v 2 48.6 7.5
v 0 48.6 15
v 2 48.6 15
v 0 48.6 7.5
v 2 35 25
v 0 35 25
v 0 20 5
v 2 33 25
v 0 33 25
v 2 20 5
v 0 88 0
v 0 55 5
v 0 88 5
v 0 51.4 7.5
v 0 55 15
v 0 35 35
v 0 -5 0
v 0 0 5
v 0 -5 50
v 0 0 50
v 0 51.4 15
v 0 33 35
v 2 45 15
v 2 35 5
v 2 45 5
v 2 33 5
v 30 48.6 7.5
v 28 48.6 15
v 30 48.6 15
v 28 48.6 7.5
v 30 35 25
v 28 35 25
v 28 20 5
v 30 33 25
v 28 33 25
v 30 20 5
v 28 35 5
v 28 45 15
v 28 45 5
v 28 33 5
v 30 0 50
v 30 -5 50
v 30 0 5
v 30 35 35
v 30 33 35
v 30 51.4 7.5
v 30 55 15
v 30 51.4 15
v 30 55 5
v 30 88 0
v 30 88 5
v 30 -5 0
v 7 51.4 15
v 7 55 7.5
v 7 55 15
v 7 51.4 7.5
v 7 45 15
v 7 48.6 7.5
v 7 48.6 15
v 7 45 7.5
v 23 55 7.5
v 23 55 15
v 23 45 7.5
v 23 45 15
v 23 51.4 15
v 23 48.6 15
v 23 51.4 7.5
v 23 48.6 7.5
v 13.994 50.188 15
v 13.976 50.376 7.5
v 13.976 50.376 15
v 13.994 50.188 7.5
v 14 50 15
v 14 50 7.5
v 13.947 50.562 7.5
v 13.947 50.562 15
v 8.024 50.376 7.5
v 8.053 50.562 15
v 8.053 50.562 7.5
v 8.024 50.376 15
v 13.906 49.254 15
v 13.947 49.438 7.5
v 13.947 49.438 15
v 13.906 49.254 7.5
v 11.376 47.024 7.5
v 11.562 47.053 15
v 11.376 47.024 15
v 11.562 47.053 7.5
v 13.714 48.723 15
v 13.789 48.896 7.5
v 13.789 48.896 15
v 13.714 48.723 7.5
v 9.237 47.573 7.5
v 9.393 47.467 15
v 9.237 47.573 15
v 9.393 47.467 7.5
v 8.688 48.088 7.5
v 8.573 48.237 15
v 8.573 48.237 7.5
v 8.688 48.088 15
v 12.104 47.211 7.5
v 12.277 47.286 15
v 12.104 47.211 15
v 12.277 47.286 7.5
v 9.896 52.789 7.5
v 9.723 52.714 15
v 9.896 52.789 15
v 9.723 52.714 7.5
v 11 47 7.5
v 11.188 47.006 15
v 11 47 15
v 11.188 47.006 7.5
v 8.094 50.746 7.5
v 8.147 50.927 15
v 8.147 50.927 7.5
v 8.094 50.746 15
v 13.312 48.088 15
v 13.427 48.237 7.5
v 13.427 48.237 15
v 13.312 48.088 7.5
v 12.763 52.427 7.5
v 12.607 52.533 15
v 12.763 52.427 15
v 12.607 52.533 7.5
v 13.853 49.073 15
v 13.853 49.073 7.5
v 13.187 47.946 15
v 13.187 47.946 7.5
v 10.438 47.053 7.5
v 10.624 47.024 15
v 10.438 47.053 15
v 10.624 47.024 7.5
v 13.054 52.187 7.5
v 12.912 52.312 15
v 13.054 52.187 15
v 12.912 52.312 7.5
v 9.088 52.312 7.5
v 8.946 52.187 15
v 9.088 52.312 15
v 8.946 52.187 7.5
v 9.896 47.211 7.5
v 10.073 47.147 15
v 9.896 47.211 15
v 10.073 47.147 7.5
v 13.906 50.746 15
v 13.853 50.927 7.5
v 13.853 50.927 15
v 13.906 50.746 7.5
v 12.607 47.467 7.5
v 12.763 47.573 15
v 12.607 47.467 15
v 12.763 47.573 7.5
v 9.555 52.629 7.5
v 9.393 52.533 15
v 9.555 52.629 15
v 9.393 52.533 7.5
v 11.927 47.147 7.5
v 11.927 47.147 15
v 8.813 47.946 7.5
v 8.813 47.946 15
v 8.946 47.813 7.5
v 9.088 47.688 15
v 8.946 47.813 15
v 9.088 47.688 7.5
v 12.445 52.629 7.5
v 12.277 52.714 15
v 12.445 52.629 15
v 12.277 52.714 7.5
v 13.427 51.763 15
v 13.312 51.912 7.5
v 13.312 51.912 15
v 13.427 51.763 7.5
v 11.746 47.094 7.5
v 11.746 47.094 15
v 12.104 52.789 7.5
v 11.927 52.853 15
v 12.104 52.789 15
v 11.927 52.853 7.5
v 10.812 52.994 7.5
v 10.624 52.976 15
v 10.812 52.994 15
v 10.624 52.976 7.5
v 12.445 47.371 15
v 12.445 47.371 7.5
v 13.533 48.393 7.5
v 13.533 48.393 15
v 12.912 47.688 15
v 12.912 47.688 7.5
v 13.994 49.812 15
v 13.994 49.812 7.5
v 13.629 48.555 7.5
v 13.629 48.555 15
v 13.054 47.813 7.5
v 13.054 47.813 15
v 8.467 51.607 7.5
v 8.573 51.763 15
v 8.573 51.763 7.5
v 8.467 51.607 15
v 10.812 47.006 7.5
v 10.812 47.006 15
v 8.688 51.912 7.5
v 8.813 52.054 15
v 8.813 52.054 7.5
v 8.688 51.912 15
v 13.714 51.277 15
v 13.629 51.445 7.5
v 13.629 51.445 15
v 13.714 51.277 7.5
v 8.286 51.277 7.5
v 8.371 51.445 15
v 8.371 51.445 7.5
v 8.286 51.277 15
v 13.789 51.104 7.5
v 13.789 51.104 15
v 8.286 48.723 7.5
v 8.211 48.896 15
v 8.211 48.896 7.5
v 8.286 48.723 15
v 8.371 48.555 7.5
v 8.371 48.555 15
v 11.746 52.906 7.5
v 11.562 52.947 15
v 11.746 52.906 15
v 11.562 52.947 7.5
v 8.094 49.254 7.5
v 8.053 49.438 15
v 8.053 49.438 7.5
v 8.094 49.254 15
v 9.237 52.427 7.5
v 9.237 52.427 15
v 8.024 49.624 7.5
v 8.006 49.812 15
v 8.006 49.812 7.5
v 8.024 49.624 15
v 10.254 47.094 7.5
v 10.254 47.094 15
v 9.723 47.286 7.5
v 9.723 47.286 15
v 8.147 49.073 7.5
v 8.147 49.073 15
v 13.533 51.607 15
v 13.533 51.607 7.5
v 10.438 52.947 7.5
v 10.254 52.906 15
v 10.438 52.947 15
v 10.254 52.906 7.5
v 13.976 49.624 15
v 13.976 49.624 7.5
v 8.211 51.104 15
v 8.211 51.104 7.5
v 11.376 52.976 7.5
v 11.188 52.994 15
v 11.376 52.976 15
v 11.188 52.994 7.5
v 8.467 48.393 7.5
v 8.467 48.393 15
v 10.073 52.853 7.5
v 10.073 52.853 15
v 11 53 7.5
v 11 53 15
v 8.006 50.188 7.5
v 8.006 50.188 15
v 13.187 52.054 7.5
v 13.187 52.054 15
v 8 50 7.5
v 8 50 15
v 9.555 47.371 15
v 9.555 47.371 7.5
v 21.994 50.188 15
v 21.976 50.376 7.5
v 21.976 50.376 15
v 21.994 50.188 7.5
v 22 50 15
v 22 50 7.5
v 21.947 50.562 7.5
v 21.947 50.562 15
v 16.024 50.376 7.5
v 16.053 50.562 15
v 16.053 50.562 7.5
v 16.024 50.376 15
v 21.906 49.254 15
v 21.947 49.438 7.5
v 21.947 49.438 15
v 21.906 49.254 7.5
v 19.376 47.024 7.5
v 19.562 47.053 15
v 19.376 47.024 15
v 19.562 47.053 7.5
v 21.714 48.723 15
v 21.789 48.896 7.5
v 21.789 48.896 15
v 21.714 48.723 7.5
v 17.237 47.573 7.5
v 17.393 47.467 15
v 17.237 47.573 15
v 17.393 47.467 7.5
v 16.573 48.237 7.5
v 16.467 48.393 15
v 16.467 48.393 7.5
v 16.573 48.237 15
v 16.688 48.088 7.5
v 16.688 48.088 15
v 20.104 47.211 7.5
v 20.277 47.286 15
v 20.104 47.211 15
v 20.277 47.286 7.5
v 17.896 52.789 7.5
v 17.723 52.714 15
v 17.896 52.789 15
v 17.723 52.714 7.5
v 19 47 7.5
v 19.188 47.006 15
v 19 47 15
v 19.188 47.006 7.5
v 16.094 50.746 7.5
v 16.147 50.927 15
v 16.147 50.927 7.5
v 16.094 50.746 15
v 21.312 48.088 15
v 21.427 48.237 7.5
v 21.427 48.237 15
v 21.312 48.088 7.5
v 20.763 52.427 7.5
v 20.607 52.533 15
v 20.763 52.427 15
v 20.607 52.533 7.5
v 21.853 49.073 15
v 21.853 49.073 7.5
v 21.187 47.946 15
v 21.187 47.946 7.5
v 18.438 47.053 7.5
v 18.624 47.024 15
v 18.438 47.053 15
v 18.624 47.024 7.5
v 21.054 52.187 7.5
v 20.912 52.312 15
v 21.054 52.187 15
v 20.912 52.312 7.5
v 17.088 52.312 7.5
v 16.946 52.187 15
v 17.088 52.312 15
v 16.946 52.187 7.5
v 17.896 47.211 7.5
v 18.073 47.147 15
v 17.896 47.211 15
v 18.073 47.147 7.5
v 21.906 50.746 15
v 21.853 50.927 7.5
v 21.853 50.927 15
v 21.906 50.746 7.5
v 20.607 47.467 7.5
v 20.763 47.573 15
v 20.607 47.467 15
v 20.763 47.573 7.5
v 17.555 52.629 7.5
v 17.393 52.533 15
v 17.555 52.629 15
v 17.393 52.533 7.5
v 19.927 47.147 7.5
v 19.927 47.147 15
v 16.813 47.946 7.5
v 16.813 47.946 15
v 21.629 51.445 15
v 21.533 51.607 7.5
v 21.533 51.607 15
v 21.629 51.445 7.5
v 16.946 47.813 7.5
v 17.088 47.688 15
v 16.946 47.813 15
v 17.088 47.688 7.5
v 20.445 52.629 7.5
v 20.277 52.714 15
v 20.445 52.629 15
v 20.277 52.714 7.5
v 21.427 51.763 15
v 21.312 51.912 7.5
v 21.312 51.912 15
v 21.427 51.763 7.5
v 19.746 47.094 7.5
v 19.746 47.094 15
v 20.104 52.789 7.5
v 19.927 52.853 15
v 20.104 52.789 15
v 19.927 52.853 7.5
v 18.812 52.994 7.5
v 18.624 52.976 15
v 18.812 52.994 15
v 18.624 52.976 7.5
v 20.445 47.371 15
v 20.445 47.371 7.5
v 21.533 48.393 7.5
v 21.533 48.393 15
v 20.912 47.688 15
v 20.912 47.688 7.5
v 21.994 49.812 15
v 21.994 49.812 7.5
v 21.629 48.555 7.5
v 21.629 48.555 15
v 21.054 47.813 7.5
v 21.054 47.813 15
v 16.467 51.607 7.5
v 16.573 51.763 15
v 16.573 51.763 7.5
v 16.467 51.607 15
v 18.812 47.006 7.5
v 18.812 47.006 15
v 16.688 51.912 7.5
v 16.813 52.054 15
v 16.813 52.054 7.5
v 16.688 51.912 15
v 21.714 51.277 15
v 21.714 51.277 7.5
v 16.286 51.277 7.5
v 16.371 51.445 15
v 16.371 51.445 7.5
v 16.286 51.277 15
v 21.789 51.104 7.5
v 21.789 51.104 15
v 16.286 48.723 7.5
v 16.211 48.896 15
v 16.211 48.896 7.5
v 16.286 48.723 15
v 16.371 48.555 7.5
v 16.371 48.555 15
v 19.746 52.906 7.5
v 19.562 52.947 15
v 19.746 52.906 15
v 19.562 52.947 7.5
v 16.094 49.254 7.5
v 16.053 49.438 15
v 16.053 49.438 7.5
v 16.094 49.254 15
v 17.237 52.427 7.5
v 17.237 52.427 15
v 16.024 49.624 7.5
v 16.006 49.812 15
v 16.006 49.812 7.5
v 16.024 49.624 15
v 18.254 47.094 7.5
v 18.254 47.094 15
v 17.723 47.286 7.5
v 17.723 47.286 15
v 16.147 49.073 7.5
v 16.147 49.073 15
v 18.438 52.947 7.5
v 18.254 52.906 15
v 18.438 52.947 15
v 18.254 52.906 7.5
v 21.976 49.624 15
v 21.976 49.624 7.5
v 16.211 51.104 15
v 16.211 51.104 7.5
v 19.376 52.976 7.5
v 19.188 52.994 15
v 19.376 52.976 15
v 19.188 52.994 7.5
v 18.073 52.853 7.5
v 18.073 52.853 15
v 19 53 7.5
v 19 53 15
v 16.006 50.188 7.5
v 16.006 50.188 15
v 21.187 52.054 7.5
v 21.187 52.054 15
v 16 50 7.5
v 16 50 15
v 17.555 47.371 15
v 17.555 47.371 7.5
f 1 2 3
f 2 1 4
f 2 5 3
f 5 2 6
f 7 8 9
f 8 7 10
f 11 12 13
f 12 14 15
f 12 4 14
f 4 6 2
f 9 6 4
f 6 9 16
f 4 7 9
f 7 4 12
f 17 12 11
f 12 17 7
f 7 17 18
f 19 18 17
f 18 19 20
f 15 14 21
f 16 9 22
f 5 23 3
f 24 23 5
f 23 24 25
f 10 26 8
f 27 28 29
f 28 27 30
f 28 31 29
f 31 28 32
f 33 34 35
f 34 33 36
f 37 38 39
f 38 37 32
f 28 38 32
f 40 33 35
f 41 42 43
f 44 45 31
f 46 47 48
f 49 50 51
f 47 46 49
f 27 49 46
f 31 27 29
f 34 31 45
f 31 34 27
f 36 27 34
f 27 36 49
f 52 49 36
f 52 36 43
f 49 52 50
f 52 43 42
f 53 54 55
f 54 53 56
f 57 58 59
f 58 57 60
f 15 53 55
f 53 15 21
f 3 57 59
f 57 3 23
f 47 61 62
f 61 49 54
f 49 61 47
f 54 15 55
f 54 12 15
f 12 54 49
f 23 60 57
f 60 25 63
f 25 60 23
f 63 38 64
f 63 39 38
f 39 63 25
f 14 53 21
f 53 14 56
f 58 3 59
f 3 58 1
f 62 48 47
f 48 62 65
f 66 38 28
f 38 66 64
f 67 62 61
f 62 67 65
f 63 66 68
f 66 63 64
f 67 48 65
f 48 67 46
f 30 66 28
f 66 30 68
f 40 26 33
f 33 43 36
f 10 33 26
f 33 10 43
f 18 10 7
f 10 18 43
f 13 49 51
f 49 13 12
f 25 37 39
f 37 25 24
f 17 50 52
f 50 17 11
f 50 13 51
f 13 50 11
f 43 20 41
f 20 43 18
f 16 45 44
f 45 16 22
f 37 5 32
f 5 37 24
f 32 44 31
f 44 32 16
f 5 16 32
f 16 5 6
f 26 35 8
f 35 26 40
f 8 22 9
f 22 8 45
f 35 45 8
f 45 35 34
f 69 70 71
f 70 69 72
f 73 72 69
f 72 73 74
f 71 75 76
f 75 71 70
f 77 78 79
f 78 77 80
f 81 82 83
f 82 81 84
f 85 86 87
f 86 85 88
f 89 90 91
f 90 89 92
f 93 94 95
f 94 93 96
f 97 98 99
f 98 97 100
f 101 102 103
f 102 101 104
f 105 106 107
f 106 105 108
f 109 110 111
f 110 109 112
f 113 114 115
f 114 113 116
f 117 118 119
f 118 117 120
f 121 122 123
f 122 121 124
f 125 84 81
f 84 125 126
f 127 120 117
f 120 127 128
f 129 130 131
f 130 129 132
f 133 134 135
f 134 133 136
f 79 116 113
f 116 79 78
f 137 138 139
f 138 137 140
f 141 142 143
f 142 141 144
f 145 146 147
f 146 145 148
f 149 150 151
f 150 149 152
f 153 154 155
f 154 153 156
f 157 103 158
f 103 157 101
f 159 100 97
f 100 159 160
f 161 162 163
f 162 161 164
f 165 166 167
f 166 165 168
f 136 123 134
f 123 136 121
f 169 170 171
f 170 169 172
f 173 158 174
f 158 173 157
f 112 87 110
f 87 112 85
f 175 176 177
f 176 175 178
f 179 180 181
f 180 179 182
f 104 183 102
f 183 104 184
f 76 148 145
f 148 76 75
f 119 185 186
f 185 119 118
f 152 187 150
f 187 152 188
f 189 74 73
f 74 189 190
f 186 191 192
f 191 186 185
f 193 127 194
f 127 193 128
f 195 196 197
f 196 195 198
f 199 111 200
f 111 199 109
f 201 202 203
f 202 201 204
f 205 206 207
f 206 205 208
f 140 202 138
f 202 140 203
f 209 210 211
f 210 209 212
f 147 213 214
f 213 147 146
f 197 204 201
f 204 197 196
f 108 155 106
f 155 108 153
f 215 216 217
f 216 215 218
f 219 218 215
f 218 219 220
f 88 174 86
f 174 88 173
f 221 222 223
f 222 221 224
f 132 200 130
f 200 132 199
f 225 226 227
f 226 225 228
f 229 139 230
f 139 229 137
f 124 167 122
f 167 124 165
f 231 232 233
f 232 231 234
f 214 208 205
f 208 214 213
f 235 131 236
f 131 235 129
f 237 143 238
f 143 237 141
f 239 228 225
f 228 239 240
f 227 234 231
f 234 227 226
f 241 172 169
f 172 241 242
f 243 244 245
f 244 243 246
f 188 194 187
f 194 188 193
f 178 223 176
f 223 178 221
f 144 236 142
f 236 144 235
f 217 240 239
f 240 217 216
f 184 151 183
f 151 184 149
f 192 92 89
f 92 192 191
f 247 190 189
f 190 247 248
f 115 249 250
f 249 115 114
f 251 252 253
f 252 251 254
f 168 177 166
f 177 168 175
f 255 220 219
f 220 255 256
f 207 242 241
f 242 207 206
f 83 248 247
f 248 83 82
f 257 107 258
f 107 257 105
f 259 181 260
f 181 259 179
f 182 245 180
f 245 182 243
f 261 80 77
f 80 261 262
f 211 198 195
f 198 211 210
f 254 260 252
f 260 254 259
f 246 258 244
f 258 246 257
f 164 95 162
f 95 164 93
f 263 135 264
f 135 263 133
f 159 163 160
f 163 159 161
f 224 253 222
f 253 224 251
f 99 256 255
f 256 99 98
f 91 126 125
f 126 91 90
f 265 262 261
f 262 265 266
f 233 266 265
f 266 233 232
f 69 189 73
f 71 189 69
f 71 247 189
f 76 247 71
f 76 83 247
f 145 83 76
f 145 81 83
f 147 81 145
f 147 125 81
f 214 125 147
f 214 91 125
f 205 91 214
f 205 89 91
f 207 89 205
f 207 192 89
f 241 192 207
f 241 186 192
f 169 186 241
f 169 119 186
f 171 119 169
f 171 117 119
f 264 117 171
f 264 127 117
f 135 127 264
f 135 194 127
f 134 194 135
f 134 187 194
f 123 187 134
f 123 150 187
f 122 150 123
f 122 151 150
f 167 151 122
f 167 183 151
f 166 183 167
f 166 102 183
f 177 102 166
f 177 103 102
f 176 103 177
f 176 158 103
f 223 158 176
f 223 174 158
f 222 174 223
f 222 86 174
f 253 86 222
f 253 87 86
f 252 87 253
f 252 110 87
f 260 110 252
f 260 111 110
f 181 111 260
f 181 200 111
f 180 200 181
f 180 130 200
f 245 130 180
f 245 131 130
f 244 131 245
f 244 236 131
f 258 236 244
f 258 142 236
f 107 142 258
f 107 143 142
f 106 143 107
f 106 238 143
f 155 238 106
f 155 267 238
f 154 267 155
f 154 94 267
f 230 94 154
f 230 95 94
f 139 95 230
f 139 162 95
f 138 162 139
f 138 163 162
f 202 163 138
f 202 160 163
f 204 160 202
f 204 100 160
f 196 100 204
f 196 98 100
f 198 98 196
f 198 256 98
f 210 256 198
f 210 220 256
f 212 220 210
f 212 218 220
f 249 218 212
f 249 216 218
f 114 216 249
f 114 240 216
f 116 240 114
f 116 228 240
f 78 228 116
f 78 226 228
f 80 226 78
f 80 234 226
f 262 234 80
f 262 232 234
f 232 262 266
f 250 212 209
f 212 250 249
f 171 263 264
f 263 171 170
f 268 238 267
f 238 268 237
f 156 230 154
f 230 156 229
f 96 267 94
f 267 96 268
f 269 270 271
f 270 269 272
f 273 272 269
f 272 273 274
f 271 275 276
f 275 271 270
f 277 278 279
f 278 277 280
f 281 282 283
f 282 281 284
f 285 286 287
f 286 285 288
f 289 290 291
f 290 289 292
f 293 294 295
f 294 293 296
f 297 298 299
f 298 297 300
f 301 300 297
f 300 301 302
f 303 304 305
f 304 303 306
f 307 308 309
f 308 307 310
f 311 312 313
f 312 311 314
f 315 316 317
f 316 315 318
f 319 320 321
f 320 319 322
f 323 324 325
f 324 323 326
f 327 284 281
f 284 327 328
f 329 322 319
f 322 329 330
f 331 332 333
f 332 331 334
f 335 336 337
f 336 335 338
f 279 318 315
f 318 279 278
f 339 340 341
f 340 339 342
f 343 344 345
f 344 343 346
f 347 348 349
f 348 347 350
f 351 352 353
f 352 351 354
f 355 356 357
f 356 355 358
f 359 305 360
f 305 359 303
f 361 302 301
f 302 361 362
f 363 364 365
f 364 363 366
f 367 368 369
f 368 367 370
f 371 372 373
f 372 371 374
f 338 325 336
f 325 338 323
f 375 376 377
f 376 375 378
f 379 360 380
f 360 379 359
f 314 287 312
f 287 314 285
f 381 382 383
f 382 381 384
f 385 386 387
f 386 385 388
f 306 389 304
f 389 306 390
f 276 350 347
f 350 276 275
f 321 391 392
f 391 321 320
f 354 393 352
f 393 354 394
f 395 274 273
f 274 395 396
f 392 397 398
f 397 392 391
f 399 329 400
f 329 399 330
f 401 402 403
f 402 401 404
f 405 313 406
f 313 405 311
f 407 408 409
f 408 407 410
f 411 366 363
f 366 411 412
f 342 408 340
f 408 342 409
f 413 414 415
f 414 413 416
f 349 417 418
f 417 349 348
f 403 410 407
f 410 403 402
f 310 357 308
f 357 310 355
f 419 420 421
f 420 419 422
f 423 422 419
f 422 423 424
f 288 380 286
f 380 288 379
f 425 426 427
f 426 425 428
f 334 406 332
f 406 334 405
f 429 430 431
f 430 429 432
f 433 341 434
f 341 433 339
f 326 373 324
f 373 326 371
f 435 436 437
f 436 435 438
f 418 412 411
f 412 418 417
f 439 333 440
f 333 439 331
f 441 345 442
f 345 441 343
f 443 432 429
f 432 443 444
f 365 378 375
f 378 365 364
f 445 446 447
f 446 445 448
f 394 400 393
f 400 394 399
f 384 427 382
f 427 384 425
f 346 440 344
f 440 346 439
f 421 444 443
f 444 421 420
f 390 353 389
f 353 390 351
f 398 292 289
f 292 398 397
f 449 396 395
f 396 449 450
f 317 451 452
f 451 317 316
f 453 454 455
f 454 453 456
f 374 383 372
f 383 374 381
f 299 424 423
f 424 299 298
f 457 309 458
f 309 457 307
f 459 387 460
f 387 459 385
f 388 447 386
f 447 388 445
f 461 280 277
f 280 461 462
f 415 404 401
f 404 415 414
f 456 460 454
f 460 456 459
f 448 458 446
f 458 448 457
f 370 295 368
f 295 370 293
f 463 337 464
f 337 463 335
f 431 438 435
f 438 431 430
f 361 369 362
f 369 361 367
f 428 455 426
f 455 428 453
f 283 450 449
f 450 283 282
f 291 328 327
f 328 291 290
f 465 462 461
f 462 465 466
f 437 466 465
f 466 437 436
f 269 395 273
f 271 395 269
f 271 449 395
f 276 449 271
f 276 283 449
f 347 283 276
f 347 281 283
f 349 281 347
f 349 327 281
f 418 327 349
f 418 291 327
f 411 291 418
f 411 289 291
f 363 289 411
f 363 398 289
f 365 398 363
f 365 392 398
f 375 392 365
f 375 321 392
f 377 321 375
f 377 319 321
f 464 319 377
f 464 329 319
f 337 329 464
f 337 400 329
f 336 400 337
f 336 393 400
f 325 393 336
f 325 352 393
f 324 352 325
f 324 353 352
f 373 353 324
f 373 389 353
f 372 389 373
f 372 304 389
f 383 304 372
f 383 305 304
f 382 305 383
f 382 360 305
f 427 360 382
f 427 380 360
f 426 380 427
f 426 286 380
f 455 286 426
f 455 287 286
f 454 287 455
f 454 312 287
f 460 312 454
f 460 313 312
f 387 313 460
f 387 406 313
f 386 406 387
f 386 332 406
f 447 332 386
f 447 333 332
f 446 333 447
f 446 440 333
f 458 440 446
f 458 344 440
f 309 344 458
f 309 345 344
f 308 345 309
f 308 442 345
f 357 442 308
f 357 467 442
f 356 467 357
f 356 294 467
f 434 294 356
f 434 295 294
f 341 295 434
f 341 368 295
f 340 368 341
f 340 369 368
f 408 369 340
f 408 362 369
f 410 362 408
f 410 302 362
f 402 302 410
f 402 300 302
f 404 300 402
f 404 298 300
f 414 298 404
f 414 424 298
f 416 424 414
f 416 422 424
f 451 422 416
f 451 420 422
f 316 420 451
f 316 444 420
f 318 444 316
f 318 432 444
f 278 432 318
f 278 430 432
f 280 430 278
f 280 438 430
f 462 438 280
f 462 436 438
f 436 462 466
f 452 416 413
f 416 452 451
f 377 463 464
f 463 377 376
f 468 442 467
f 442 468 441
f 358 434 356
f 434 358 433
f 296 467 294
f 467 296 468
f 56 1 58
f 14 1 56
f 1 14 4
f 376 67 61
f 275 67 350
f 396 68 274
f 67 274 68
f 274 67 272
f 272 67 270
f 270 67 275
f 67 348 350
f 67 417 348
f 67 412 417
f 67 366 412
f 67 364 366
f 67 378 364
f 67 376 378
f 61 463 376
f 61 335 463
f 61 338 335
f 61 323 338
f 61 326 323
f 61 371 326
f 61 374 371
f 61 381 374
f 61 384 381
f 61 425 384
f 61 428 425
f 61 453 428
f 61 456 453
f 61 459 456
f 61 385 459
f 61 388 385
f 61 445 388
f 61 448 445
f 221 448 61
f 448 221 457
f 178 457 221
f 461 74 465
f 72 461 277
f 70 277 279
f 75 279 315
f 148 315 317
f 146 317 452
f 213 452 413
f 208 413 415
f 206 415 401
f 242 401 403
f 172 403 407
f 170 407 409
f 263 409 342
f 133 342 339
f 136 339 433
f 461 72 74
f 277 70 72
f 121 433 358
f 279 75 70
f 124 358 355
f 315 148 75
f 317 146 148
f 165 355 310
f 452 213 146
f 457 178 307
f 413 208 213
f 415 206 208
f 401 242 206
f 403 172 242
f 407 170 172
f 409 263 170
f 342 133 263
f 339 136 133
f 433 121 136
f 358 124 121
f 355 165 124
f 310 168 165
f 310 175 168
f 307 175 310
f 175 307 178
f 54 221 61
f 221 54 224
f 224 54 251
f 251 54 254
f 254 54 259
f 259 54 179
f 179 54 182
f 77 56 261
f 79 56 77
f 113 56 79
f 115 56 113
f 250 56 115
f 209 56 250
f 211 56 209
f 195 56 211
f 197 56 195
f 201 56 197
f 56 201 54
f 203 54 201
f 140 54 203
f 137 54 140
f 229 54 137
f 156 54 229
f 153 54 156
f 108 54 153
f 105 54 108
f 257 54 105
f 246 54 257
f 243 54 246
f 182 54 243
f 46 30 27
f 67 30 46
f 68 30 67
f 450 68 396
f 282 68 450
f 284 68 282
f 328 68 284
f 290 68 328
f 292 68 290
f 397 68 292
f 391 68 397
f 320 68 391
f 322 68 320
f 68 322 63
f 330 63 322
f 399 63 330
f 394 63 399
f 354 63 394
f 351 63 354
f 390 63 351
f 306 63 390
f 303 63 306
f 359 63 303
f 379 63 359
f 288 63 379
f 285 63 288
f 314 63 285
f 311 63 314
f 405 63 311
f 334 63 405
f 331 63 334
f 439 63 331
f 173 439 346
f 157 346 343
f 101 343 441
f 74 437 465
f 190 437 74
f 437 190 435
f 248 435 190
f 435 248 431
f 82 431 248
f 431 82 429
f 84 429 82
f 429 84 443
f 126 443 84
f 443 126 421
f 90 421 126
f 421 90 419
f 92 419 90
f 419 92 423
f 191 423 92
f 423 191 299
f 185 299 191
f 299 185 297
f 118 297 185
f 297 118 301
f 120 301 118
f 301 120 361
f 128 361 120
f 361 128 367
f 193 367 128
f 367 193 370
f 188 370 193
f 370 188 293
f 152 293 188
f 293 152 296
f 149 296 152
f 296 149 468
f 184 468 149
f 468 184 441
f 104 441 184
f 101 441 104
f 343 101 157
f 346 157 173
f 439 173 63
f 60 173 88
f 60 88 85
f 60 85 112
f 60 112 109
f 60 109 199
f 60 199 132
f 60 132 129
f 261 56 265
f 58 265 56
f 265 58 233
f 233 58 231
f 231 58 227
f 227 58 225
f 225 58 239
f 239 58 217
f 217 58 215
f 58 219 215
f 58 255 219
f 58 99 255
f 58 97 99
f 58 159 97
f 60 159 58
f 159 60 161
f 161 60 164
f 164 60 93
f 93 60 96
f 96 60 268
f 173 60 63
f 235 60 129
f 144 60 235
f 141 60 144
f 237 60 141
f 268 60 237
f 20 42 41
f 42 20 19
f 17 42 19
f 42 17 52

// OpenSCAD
$fn=100;

module x_caridge_base()
{
        cube([30,88,5]);
        // endstop insert
        translate([0,33,5])
            cube([30,2,30]);
        for(i=[0:1])
            translate([28*i,0,0])
                hull()
                {
                    translate([0,48.6,5])
                        rotate([0,90,0])
                            cylinder(d=0.001, h=2);
                    translate([0,48.6,15])
                        rotate([0,90,0])
                            cylinder(d=0.001, h=2);
                    translate([0,35,25])
                        rotate([0,90,0])
                            cylinder(d=0.001, h=2);
                    translate([0,33,25])
                        rotate([0,90,0])
                            cylinder(d=0.001, h=2);
                    translate([0,20,5])
                        rotate([0,90,0])
                            cylinder(d=0.001, h=2);
                }
        translate([11,50,5])
            cylinder(d=6,h=10);
        translate([19,50,5])
            cylinder(d=6,h=10);
        translate([0,45,5])
            cube([30,10,2.5]);
        difference()
        {
            translate([0,45,5])
                cube([7,10,10]);
            translate([-0.001,48.6,5])
                cube([7.002,2.8,10.001]);
        }
        difference()
        {
            translate([23,45,5])
                cube([7,10,10]);
            translate([22.999,48.6,5])
                cube([7.002,2.8,10.001]);
        }
        translate([0,-5,0])
            cube([30,5,50]);
}

x_caridge_base();
